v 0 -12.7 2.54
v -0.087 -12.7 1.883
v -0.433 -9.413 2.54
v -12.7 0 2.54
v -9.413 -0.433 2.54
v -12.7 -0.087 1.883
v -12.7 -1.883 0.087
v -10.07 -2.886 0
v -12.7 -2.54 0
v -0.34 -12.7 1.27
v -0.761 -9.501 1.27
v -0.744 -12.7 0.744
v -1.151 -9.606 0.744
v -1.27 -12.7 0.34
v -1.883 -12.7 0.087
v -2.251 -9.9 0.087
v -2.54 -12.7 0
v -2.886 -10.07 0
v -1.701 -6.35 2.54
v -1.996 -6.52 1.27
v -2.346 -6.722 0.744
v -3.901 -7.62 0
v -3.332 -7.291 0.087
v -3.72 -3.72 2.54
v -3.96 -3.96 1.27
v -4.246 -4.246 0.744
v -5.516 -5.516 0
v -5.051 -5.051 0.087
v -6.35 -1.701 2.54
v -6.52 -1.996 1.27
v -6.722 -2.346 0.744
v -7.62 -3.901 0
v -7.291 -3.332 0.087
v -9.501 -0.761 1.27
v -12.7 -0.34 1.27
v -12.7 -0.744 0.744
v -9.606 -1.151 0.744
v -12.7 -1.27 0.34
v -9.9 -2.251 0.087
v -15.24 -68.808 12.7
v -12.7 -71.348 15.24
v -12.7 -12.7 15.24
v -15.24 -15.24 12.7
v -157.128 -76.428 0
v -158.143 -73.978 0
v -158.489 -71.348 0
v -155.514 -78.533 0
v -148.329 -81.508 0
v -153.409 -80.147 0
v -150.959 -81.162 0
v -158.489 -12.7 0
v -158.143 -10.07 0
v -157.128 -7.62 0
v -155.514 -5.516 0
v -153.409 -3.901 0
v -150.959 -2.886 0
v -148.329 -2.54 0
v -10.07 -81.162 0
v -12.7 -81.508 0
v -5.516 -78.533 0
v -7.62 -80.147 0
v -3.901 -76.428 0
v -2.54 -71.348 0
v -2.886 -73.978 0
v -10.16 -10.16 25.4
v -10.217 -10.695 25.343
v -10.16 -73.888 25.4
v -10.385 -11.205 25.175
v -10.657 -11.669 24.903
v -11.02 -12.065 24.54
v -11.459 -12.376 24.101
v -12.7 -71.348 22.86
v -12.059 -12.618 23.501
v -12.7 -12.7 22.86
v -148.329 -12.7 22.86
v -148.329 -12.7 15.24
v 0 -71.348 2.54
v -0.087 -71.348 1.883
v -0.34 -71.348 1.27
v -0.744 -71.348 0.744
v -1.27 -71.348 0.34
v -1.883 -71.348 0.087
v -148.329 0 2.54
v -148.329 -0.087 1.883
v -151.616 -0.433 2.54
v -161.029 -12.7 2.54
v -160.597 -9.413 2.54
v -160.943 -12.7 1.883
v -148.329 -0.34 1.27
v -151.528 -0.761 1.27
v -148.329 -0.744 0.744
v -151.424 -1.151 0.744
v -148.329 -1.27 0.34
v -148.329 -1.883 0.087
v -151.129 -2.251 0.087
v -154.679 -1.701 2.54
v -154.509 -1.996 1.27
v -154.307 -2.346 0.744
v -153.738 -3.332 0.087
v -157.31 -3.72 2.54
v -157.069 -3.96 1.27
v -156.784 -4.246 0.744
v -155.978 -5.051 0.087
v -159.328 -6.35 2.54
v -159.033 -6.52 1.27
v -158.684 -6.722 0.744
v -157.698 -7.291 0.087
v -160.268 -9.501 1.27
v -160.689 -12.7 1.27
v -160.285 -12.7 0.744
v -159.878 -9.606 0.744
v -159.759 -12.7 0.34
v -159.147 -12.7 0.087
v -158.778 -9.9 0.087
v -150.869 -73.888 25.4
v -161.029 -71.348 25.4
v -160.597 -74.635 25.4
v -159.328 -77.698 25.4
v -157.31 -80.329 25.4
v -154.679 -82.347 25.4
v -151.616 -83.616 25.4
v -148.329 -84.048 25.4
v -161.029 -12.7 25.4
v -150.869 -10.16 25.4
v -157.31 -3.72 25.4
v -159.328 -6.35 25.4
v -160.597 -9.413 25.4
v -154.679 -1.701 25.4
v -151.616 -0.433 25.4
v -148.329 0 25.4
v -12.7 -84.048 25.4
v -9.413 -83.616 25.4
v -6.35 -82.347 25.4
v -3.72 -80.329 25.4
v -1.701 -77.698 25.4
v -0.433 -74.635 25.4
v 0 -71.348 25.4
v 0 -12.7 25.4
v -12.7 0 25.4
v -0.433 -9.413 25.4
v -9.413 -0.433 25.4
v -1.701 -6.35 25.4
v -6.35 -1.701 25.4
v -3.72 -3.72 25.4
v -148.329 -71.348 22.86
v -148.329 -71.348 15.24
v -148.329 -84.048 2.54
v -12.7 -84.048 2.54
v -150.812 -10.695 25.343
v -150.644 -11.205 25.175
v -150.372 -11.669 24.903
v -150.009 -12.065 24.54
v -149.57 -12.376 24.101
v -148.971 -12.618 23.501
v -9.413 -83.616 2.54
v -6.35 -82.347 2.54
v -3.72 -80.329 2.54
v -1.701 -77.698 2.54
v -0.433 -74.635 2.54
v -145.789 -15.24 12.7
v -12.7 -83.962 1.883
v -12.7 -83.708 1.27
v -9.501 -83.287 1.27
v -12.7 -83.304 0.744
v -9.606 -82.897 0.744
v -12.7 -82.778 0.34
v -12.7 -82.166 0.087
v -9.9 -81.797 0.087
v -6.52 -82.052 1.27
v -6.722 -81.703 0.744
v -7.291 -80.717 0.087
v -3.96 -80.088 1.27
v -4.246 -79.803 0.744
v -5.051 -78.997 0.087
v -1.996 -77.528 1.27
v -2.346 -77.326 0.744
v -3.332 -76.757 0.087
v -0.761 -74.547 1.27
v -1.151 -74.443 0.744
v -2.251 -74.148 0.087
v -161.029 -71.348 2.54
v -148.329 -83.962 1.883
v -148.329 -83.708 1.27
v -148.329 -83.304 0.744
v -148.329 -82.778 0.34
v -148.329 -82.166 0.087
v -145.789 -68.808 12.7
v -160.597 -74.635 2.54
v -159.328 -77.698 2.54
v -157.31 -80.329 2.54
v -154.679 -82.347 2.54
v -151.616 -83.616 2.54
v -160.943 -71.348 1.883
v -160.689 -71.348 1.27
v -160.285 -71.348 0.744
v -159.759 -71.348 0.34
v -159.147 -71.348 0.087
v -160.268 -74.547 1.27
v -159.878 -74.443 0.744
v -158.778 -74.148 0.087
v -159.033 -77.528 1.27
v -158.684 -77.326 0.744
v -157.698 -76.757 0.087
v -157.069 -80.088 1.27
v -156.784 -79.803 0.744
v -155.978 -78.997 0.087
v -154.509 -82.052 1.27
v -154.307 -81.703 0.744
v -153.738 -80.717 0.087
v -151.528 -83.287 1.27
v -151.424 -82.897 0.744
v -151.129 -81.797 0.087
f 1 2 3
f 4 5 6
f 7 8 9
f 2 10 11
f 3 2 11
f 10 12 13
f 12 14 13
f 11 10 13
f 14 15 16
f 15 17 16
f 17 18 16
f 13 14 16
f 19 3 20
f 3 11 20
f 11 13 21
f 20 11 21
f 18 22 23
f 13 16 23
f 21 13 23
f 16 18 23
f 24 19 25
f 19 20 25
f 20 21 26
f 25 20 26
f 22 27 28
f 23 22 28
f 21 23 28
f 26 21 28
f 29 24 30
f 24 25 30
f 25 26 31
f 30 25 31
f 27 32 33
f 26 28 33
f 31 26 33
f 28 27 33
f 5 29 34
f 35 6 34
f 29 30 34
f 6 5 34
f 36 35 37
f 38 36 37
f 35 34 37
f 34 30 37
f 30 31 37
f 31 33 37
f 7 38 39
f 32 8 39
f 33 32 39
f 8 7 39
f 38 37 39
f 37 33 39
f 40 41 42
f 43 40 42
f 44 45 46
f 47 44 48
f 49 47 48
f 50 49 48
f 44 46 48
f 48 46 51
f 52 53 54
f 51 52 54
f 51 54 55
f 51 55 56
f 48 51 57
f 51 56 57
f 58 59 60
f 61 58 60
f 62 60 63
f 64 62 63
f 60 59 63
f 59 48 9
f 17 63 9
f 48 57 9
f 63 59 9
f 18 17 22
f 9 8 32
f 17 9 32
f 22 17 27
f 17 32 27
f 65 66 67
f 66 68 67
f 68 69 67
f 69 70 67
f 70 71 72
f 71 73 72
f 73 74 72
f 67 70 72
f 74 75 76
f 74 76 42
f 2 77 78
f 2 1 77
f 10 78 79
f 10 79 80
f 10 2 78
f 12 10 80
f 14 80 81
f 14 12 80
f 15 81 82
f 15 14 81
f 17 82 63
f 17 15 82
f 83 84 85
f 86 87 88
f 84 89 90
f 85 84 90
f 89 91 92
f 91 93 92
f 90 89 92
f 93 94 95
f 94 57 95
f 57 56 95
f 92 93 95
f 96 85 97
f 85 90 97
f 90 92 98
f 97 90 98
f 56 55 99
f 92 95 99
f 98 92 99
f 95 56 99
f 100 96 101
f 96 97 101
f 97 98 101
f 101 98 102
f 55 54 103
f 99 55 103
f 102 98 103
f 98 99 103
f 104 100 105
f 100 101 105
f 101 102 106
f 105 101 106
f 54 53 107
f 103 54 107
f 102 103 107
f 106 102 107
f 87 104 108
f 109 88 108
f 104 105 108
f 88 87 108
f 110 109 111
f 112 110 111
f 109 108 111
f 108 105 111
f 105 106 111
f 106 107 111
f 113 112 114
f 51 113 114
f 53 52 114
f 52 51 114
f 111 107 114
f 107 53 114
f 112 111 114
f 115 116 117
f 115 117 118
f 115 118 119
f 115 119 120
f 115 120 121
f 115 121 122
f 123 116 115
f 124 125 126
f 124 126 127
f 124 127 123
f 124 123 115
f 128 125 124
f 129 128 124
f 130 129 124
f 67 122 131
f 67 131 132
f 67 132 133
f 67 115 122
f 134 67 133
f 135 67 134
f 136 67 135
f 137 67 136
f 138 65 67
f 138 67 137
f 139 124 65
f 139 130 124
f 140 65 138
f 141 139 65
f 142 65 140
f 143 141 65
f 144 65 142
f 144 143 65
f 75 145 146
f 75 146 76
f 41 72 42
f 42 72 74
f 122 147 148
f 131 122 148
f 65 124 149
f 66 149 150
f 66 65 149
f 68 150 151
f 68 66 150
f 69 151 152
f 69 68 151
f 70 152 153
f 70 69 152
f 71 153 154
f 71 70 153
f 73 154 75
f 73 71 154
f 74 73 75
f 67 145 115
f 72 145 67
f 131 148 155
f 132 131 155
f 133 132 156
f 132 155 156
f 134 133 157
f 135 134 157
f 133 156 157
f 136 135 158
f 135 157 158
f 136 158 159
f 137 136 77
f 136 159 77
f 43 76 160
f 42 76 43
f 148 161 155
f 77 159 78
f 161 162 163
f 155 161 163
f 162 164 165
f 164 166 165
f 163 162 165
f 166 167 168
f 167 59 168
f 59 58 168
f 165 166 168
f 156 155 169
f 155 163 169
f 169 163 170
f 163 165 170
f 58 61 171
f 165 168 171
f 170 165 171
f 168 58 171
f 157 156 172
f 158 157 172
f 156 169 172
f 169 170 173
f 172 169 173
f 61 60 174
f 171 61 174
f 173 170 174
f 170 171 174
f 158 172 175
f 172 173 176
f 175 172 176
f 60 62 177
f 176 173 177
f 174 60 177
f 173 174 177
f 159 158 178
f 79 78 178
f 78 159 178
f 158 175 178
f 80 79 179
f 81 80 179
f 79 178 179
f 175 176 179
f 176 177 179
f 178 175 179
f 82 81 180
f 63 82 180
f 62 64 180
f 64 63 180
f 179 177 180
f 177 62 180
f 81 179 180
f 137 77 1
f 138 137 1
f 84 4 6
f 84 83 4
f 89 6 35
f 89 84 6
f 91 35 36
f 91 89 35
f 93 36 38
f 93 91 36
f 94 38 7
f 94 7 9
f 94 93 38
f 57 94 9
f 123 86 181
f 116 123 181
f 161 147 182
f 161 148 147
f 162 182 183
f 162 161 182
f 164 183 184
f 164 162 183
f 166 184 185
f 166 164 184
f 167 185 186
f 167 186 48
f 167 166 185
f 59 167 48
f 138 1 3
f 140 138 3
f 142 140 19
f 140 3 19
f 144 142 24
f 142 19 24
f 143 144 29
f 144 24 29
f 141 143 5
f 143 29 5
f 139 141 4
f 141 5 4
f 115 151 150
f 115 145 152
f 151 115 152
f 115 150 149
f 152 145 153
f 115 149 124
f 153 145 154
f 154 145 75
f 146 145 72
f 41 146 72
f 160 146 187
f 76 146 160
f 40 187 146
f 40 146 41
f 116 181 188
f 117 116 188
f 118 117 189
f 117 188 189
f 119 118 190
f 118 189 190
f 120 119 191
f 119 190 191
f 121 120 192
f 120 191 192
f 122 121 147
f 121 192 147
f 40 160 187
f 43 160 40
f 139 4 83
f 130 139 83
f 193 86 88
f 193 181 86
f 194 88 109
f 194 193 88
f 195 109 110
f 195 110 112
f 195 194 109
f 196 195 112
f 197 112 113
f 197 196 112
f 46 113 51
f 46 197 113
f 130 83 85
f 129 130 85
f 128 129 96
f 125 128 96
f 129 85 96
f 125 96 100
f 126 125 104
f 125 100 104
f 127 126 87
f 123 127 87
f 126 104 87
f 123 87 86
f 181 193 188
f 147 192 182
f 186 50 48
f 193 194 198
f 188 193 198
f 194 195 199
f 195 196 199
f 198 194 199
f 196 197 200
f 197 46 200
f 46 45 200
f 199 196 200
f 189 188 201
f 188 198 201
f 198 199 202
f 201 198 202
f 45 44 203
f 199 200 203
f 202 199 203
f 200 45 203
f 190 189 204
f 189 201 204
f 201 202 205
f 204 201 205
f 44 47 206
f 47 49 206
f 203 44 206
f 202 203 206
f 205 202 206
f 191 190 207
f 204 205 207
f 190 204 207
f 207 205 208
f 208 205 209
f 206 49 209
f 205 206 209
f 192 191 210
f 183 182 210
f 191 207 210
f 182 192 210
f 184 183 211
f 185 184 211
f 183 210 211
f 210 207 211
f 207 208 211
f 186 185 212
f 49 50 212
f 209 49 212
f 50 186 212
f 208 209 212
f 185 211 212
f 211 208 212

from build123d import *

# Parameters (mm, degrees)
F1_DEPTH = 25.4
F2_W     = 135.629368639
F2_H     = 58.648413825
F3_DEPTH = 12.7
F4_R     = 2.54
F5_SIZE  = 2.54


with BuildPart() as f1:
    # F0 (on Top) → F1 (new body)
    with BuildSketch(Plane.XY):
        with BuildLine():
            Line((-12.7, 0), (-148.329368639, 0))
            ThreePointArc((-148.329368639, 0), (-157.3096247601, -3.7197438789), (-161.029368639, -12.7))
            Line((-161.029368639, -12.7), (-161.029368639, -71.348413825))
            ThreePointArc((-161.029368639, -71.348413825), (-157.3096247601, -80.3286699461), (-148.329368639, -84.048413825))
            Line((-148.329368639, -84.048413825), (-12.7, -84.048413825))
            ThreePointArc((-12.7, -84.048413825), (-3.7197438789, -80.3286699461), (0, -71.348413825))
            Line((0, -71.348413825), (0, -12.7))
            ThreePointArc((0, -12.7), (-3.7197438789, -3.7197438789), (-12.7, 0))
        make_face()
    extrude(amount=F1_DEPTH)

    # F2 (on face) → F3 (cut)
    with BuildSketch(Plane.XY.offset(25.4)):
        with Locations((-80.5146843195, -42.0242069125)):
            Rectangle(F2_W, F2_H)
    extrude(amount=-F3_DEPTH, mode=Mode.SUBTRACT)

    # F4
    f4_edges = [f1.edges().sort_by_distance(p)[0] for p in [
        (-80.514684, -12.7, 25.4),
        (-80.514684, 0, 0),
        (-157.309625, -3.719744, 0),
        (-161.029369, -42.024207, 0),
        (-157.309625, -80.32867, 0),
        (-80.514684, -84.048414, 0),
        (-3.719744, -80.32867, 0),
        (0, -42.024207, 0),
        (-3.719744, -3.719744, 0),
    ]]
    fillet(f4_edges, radius=F4_R)

    # F5
    f5_edges = [f1.edges().sort_by_distance(p)[0] for p in [
        (-12.7, -42.024207, 12.7),
        (-80.514684, -12.7, 12.7),
        (-148.329369, -42.024207, 12.7),
        (-80.514684, -71.348414, 12.7),
        (-80.514684, -10.16, 25.4),
        (-148.329369, -42.024207, 25.4),
        (-80.514684, -71.348414, 25.4),
        (-12.7, -42.024207, 25.4),
    ]]
    chamfer(f5_edges, length=F5_SIZE)


solid = f1.part
